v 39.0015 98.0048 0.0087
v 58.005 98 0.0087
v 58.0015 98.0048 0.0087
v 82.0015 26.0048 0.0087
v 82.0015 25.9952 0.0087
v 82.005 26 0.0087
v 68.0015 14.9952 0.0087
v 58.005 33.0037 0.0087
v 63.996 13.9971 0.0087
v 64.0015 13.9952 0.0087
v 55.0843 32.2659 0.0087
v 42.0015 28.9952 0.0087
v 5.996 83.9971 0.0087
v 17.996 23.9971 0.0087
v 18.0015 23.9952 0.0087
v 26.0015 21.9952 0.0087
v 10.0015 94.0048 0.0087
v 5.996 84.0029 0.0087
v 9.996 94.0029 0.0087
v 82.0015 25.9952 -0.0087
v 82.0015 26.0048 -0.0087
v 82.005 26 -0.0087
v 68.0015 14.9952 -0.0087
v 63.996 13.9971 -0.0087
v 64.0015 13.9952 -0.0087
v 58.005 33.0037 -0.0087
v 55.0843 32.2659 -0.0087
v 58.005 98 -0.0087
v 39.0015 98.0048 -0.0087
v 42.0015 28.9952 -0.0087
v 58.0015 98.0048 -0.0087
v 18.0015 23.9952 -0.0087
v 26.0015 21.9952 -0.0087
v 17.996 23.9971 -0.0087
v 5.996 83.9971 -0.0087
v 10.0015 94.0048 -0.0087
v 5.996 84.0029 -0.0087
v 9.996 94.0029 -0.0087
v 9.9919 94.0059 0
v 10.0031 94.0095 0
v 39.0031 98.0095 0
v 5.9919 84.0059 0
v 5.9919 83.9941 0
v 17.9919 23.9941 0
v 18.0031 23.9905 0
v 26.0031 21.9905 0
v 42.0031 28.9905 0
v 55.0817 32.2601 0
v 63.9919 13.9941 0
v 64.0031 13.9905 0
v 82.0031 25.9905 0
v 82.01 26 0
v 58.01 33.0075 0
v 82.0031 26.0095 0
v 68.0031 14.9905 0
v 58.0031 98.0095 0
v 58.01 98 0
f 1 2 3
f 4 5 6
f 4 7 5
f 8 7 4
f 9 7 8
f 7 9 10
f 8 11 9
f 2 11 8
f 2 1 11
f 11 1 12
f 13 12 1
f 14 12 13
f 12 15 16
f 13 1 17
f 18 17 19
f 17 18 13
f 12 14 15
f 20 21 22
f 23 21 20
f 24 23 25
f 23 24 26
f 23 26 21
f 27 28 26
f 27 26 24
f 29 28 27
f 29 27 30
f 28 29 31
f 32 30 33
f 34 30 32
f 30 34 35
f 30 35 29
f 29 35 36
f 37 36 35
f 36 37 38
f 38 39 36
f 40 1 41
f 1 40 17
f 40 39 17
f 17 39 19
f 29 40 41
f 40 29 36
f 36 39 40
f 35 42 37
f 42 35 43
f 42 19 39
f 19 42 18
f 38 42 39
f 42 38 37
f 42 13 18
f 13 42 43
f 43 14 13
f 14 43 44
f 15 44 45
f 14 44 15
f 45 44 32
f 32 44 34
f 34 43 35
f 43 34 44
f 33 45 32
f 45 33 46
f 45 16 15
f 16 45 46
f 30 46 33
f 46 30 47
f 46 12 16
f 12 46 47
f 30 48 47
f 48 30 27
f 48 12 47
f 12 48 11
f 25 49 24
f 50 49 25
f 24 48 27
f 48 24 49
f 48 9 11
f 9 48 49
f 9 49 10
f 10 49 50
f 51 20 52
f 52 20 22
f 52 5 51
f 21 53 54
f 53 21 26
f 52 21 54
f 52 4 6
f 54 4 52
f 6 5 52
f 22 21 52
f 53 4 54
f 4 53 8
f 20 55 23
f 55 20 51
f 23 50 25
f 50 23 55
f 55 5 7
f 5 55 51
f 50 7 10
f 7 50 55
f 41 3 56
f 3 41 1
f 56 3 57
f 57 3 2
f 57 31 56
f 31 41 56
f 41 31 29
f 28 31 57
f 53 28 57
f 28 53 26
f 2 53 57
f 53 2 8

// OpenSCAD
color([0.5330085163671737,0.6769359871291822,0.5973748769978083]) hull(){
    translate([18,58]) sphere(0.01);
    translate([44,55]) sphere(0.01);
    translate([44,47]) sphere(0.01);
}
color([0.14460255854654236,0.21273280877313017,0.8417179364881341]) hull(){
    translate([18,58]) sphere(0.01);
    translate([44,47]) sphere(0.01);
    translate([22,90]) sphere(0.01);
}
color([0.6300391880279899,0.5103677782275869,0.4479627161837708]) hull(){
    translate([22,90]) sphere(0.01);
    translate([44,47]) sphere(0.01);
    translate([50,93]) sphere(0.01);
}
color([0.2903518628620462,0.1744676713524972,0.5457372127765215]) hull(){
    translate([22,90]) sphere(0.01);
    translate([50,93]) sphere(0.01);
    translate([39,98]) sphere(0.01);
}
color([0.6340658375422632,0.7004271366493812,0.690956934786038]) hull(){
    translate([22,90]) sphere(0.01);
    translate([10,94]) sphere(0.01);
    translate([39,98]) sphere(0.01);
}
color([0.013948469234104865,0.8018456354370093,0.2607079205191076]) hull(){
    translate([22,90]) sphere(0.01);
    translate([10,94]) sphere(0.01);
    translate([6,84]) sphere(0.01);
}
color([0.01899716010339858,0.7507132946374245,0.44168653561511173]) hull(){
    translate([18,58]) sphere(0.01);
    translate([22,90]) sphere(0.01);
    translate([6,84]) sphere(0.01);
}
color([0.1668653701245908,0.45955837321901094,0.7876756969907556]) hull(){
    translate([18,58]) sphere(0.01);
    translate([6,84]) sphere(0.01);
    translate([18,24]) sphere(0.01);
}
color([0.09564527702692727,0.06733136152719421,0.7816649665975636]) hull(){
    translate([6,84]) sphere(0.01);
    translate([18,24]) sphere(0.01);
    translate([26,22]) sphere(0.01);
}
color([0.030385075649315252,0.33346286891595733,0.08647112242809318]) hull(){
    translate([6,84]) sphere(0.01);
    translate([26,22]) sphere(0.01);
    translate([42,29]) sphere(0.01);
}
color([0.8161439782233904,0.05657658467482607,0.8243668117903717]) hull(){
    translate([6,84]) sphere(0.01);
    translate([42,29]) sphere(0.01);
    translate([44,55]) sphere(0.01);
}
color([0.05808931884644186,0.6181904095369413,0.1426995958976538]) hull(){
    translate([44,55]) sphere(0.01);
    translate([42,29]) sphere(0.01);
    translate([58,33]) sphere(0.01);
}
color([0.3846464495954227,0.3794414211645075,0.7643773332264734]) hull(){
    translate([44,55]) sphere(0.01);
    translate([58,33]) sphere(0.01);
    translate([64,14]) sphere(0.01);
}
color([0.3116889002403487,0.7690158776827113,0.7674729074453902]) hull(){
    translate([64,14]) sphere(0.01);
    translate([58,33]) sphere(0.01);
    translate([82,26]) sphere(0.01);
}
color([0.3394448706328078,0.45855440081433096,0.0007502935671159783]) hull(){
    translate([64,14]) sphere(0.01);
    translate([82,26]) sphere(0.01);
    translate([68,15]) sphere(0.01);
}
color([0.8084995756647368,0.0331322283588068,0.9954935019736515]) hull(){
    translate([58,98]) sphere(0.01);
    translate([22,90]) sphere(0.01);
    translate([39,98]) sphere(0.01);
}
color([0.32750610520168044,0.511786711221762,0.09639677946248049]) hull(){
    translate([58,98]) sphere(0.01);
    translate([50,93]) sphere(0.01);
    translate([39,98]) sphere(0.01);
}
color([0.46647601470953737,0.043404226035316795,0.8089506697449751]) hull(){
    translate([58,98]) sphere(0.01);
    translate([50,93]) sphere(0.01);
    translate([58,33]) sphere(0.01);
}
color([0.9065579579370614,0.48874197586323487,0.4689182776921319]) hull(){
    translate([50,93]) sphere(0.01);
    translate([44,55]) sphere(0.01);
    translate([58,33]) sphere(0.01);
}
color([0.9999833648369341,0.42392948264922625,0.11056216143511133]) hull(){
    translate([50,93]) sphere(0.01);
    translate([44,55]) sphere(0.01);
    translate([44,47]) sphere(0.01);
}
